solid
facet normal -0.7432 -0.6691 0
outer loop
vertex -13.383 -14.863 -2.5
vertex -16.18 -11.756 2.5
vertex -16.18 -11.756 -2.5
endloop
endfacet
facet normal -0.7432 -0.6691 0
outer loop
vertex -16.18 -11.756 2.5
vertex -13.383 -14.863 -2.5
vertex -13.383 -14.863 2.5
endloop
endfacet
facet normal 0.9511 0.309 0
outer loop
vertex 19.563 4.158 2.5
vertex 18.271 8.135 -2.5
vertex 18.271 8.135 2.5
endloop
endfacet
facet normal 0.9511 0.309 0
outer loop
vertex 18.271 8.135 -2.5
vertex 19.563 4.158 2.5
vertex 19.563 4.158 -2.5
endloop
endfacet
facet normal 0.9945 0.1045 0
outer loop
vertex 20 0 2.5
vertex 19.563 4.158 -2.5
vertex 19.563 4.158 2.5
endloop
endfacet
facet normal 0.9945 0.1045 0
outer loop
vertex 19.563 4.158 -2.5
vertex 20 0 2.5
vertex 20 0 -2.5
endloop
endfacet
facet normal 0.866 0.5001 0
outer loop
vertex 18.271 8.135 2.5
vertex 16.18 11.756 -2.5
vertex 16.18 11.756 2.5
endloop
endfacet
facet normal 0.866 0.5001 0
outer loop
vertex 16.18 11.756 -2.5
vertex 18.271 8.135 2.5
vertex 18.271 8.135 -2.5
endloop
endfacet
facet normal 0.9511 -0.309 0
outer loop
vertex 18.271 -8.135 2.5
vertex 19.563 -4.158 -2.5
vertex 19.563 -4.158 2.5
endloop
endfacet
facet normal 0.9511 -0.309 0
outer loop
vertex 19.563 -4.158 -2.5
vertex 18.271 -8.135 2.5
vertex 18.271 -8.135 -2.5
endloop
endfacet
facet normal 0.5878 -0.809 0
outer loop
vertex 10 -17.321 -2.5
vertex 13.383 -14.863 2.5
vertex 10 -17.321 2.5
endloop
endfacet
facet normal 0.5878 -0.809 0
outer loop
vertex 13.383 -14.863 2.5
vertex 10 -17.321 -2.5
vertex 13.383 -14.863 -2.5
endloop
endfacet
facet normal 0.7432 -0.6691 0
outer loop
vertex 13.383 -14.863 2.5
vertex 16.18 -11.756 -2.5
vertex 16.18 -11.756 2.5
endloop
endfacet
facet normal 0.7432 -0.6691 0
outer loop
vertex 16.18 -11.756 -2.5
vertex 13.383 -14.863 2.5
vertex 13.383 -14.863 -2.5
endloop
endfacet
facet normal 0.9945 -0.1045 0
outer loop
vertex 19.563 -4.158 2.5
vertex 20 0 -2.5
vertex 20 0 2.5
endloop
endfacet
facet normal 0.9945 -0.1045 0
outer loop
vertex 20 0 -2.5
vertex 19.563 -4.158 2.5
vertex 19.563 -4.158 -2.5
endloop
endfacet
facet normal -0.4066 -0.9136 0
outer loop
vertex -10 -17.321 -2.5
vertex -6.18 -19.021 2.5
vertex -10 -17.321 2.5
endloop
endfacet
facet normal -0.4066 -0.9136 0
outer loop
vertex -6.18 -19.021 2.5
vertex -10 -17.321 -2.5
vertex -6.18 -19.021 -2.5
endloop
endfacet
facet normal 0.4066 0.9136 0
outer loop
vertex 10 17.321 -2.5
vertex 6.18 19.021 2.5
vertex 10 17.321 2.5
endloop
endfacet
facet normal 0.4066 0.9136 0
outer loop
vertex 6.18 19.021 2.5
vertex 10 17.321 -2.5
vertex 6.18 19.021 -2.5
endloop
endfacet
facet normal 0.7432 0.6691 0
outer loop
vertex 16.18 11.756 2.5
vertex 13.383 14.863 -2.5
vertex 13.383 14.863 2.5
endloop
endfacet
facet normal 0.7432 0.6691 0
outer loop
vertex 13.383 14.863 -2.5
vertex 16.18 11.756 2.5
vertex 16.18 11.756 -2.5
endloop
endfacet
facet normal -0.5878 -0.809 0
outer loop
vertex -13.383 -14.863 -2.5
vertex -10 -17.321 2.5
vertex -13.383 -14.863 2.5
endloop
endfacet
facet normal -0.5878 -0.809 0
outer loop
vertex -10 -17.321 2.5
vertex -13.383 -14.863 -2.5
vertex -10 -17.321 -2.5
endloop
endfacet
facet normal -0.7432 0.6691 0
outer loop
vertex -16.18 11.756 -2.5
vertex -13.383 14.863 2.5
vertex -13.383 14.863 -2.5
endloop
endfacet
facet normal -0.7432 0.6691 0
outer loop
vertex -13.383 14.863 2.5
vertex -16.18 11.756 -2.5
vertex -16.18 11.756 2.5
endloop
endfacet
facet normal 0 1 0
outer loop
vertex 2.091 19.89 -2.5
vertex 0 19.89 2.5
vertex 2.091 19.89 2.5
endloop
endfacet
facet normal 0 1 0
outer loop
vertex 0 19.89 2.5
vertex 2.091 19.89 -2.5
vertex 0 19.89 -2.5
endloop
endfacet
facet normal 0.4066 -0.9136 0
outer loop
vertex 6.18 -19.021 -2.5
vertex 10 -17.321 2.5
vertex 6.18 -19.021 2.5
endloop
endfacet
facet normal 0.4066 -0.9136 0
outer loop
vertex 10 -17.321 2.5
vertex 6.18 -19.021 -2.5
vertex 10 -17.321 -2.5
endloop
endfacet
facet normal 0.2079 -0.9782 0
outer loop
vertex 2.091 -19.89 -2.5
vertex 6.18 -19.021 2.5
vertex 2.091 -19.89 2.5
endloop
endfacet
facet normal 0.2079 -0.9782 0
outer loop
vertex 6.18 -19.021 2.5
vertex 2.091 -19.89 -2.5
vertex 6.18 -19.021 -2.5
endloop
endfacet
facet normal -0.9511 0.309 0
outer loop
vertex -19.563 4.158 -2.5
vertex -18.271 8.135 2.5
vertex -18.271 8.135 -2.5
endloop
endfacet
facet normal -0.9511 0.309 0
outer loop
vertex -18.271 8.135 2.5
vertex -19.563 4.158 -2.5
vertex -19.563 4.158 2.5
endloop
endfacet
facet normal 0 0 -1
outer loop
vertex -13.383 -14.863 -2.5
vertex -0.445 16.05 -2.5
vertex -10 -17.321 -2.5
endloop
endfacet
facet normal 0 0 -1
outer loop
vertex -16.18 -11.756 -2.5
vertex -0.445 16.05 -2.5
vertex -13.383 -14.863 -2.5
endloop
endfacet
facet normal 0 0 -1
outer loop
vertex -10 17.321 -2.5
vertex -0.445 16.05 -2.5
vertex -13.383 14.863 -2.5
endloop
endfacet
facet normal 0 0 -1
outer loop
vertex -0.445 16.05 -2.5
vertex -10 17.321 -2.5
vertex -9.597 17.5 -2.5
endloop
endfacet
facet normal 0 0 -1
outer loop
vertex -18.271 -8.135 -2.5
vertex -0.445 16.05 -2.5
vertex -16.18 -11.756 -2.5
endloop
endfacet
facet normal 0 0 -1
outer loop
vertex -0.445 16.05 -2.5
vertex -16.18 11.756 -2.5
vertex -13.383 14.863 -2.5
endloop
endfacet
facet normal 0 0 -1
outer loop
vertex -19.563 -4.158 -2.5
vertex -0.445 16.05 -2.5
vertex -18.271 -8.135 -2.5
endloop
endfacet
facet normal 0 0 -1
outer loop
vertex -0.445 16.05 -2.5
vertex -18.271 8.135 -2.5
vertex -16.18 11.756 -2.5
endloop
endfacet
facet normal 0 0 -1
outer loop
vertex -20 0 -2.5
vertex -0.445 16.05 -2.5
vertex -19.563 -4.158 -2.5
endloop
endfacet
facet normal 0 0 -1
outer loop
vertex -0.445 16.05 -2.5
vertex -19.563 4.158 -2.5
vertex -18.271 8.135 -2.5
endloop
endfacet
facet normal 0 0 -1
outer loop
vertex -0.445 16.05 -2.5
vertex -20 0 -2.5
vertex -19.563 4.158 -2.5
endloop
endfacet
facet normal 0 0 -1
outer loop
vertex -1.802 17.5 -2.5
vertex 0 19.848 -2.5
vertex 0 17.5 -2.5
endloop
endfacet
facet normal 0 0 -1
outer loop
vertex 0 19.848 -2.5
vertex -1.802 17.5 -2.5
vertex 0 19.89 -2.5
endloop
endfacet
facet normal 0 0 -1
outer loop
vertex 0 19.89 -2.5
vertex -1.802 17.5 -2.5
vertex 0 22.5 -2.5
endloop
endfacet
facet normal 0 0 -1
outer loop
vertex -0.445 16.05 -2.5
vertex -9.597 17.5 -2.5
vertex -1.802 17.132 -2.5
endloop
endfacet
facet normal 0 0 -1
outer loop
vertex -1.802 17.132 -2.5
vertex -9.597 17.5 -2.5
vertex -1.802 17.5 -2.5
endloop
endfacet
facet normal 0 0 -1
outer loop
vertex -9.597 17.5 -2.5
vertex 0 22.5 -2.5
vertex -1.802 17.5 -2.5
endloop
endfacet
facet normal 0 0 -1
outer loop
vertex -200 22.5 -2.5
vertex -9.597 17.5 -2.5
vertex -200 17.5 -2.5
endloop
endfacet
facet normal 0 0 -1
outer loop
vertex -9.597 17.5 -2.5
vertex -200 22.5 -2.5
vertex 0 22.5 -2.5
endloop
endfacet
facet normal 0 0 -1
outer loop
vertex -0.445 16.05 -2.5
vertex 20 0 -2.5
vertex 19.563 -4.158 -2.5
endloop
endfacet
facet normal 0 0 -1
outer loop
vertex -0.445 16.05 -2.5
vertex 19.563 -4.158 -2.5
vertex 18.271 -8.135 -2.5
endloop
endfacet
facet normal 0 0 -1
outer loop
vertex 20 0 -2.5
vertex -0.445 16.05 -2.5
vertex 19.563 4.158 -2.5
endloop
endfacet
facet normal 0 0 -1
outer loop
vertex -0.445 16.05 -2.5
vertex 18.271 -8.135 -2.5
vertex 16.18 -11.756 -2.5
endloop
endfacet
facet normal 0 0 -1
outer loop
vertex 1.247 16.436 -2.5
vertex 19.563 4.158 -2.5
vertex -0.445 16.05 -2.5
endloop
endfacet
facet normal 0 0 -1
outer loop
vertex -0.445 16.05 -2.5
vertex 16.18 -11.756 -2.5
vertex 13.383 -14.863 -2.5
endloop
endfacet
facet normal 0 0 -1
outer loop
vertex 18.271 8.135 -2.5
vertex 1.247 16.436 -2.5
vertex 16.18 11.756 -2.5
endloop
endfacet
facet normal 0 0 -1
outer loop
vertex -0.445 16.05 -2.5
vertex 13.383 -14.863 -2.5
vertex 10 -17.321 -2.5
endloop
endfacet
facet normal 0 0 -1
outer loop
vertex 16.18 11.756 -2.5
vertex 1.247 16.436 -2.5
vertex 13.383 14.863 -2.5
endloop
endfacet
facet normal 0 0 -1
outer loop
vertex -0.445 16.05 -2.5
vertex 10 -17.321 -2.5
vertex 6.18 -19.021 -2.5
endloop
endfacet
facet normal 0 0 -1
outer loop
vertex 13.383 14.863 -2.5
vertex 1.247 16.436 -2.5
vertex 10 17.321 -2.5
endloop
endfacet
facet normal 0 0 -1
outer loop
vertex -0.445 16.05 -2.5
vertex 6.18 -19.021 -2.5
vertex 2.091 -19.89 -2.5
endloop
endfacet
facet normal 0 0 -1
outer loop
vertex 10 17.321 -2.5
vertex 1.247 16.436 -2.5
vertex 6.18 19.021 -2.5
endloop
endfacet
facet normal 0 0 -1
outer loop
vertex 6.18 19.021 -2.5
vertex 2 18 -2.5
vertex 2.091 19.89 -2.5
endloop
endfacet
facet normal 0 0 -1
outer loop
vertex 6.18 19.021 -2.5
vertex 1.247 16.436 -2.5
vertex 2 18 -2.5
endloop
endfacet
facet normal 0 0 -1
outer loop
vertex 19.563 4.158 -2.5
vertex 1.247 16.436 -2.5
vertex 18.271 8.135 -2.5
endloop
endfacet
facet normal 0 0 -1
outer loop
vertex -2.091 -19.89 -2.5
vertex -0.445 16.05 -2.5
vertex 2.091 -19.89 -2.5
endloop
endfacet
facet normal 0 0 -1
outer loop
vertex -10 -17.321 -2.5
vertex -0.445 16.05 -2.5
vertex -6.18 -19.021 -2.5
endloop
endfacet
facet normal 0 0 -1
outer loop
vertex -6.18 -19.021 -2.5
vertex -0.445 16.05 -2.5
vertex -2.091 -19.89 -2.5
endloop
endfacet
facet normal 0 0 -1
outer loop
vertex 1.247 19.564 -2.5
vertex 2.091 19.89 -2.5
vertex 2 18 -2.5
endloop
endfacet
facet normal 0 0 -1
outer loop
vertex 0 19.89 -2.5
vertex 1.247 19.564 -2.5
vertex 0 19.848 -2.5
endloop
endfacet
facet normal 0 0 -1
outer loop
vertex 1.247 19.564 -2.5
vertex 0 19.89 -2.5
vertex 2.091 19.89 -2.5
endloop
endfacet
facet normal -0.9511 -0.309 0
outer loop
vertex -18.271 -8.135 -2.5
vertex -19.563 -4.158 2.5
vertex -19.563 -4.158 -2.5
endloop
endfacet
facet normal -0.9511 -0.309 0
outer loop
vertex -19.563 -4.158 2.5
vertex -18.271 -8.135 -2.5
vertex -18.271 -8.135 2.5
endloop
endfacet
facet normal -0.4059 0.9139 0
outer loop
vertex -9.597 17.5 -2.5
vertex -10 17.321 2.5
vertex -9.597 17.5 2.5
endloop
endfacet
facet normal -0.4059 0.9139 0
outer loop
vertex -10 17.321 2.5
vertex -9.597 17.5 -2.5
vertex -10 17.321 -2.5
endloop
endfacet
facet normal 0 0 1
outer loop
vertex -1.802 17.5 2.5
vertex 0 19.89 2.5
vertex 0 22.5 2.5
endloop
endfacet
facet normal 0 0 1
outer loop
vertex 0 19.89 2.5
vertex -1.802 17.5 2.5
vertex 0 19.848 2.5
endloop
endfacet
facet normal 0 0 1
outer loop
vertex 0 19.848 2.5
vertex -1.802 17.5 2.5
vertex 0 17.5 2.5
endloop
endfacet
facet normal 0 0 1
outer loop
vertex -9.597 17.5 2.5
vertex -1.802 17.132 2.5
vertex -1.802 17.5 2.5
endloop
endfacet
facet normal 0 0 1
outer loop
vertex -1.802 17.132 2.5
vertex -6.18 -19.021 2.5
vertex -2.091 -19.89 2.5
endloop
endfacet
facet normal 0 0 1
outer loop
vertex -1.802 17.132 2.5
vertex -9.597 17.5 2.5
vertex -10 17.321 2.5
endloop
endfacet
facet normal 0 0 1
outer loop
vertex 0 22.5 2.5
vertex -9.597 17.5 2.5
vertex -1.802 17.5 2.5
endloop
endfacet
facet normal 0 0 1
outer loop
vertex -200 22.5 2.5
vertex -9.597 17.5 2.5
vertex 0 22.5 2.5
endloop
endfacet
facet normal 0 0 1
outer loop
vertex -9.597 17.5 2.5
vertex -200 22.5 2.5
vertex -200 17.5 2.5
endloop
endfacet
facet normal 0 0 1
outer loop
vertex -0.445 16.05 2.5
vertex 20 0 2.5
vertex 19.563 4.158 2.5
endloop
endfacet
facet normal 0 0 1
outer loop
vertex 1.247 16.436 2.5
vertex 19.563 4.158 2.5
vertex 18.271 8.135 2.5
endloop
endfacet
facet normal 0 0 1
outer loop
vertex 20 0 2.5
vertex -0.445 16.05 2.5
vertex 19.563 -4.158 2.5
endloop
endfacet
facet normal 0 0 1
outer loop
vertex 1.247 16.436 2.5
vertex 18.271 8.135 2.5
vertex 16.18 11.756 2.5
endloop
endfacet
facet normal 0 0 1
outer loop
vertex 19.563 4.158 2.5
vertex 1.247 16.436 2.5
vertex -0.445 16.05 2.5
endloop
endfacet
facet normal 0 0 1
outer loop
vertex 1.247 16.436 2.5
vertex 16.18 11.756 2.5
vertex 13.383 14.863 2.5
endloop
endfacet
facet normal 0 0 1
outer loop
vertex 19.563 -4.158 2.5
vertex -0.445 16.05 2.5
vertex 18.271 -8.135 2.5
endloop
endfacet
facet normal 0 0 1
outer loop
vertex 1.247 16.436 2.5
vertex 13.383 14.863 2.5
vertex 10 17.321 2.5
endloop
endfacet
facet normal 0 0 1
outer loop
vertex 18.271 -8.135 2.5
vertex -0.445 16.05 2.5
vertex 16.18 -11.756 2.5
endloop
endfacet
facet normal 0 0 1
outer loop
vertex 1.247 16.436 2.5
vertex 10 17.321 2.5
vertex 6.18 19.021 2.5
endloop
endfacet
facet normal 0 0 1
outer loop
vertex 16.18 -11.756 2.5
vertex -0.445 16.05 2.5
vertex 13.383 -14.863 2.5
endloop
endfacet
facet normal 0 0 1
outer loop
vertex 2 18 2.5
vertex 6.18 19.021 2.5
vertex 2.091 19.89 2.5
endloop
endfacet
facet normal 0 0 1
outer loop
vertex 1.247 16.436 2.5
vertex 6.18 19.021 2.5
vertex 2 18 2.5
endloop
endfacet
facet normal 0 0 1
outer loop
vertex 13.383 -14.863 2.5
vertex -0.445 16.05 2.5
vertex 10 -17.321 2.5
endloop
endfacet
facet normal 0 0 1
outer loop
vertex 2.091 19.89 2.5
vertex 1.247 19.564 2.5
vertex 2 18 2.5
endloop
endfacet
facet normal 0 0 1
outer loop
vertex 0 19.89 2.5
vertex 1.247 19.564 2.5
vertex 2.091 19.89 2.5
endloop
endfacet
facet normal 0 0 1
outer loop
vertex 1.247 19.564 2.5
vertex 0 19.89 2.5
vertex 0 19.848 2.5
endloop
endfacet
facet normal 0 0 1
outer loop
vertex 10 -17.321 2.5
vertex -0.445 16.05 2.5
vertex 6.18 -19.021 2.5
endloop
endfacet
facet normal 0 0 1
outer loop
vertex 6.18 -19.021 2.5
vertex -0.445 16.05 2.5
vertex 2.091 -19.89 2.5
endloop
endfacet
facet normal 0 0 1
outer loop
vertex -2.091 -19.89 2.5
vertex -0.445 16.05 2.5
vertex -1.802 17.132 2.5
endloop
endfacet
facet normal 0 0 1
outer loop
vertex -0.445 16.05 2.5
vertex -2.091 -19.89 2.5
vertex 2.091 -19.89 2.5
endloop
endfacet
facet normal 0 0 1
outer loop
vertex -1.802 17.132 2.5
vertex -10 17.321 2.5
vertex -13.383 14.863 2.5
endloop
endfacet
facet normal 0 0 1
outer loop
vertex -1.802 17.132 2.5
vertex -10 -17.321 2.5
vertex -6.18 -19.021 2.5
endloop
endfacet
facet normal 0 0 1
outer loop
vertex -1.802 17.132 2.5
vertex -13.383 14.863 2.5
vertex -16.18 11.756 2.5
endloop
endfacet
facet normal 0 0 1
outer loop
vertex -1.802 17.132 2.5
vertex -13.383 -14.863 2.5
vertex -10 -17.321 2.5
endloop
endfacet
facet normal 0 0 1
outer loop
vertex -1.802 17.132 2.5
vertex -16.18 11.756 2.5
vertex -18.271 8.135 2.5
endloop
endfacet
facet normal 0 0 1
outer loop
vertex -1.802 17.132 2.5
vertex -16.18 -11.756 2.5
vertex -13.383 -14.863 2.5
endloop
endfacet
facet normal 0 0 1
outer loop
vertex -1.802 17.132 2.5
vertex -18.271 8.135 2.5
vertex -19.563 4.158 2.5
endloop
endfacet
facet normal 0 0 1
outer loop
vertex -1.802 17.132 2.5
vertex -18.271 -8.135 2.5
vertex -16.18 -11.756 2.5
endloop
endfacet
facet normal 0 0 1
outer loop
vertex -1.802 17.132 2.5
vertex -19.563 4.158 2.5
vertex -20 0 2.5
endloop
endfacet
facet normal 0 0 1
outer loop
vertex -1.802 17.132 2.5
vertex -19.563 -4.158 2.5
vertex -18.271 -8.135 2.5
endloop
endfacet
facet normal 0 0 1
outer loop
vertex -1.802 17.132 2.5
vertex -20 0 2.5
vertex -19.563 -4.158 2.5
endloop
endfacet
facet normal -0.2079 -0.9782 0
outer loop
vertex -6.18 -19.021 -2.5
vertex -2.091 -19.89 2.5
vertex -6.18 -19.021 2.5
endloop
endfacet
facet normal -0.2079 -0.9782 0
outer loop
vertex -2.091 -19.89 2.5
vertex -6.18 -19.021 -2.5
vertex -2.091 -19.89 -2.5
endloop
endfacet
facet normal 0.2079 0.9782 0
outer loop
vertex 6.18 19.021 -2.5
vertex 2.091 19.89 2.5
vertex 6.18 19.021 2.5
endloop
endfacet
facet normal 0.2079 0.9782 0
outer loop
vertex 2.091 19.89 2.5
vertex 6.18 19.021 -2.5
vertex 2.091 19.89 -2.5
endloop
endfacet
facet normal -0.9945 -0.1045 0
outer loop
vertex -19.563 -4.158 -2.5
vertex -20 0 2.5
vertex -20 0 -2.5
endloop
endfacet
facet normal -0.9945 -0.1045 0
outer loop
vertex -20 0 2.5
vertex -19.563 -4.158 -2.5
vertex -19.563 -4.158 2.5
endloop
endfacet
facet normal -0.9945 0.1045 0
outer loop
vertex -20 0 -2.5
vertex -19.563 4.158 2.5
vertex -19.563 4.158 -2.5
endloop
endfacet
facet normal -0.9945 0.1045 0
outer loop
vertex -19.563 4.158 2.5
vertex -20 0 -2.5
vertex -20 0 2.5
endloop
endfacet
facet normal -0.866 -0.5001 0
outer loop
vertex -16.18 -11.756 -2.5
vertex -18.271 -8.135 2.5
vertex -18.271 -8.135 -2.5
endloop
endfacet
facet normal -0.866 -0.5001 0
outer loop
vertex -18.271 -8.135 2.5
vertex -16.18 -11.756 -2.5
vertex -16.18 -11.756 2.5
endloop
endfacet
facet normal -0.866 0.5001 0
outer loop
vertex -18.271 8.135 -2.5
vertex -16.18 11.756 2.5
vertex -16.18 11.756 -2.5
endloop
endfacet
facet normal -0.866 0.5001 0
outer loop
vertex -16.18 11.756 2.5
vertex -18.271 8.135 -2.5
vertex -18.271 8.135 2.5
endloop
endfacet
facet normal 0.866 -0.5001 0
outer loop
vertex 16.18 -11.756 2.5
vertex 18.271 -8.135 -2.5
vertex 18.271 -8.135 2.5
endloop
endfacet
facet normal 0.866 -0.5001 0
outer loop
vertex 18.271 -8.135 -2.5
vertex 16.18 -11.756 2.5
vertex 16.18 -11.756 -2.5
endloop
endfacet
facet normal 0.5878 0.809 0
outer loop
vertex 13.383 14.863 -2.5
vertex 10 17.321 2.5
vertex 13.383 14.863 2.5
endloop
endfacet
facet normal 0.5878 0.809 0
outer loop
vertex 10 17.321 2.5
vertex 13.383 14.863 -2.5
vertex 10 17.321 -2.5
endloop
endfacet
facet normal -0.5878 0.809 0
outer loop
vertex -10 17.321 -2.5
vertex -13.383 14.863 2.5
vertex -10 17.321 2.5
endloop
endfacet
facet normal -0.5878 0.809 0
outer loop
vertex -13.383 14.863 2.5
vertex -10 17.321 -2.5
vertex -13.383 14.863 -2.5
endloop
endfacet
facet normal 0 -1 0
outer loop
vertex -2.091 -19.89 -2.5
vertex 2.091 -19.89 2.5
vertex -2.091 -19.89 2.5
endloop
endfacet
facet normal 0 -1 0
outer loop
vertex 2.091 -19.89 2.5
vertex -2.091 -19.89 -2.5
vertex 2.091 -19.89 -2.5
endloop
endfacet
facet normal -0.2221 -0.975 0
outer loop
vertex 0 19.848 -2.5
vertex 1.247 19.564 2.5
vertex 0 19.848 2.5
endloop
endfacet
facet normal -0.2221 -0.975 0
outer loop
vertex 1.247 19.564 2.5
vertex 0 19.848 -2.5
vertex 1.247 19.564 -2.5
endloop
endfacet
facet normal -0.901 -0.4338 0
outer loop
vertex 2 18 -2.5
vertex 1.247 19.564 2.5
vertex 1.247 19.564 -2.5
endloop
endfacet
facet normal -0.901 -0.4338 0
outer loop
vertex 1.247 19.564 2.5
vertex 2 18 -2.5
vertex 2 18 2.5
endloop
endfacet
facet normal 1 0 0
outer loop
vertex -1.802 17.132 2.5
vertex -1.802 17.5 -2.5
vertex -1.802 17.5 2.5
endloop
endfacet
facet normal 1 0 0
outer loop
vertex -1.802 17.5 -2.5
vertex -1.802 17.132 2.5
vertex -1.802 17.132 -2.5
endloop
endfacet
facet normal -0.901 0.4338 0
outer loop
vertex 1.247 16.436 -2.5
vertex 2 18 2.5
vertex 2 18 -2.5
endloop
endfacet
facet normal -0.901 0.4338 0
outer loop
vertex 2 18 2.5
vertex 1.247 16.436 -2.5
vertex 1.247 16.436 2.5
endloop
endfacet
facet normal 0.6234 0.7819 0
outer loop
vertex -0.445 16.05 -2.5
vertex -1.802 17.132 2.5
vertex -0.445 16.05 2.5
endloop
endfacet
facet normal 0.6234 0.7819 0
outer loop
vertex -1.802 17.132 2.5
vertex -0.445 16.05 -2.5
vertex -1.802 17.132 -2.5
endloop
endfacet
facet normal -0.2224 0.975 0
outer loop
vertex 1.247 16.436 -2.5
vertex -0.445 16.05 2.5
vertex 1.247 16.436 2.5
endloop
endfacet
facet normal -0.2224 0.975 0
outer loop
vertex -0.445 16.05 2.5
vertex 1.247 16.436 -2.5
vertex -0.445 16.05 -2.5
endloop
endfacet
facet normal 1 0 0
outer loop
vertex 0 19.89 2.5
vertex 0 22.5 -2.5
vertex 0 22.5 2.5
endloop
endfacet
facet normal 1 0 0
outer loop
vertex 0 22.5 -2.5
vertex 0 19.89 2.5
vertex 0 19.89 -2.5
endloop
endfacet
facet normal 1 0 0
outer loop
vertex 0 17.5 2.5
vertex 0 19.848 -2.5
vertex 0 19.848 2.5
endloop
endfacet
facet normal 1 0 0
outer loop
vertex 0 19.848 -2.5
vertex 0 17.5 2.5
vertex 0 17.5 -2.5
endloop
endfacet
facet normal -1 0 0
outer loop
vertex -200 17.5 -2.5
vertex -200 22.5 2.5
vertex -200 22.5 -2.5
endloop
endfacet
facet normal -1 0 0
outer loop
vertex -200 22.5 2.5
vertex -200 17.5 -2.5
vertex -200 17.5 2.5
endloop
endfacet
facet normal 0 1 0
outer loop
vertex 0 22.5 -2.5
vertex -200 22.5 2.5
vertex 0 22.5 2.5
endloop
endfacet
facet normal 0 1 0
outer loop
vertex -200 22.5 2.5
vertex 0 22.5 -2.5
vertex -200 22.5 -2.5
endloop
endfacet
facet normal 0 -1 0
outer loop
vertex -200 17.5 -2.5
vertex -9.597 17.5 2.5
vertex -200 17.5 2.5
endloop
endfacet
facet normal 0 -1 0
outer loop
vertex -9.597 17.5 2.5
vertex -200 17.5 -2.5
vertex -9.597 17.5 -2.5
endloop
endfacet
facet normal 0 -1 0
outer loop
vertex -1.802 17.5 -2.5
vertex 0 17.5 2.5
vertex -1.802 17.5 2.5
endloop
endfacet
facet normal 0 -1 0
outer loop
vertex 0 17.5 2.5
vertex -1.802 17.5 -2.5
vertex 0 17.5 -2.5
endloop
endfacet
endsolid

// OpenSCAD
module wiper_assembly(arm_length, sweep_angle)
{
    assert(arm_length > 0 && sweep_angle > 0);

    _current_angle = -cos($t * 360) * sweep_angle/2;

        cylinder(r=5, h=10, center=true);

    rotate([0, 0, _current_angle])
    {
        cube([arm_length, 10, 5]);    
    }
    
}

PI = 3.14159;


module rack_and_pinion(pinion_r, rack_length, is_assembly=true)
{
    assert(pinion_r > 0 && rack_length > 0);

    // 0 to 360
    _angle = (is_assembly) ? $t * 360 : 0;

    // pinion
    rotate([0,0,-_angle])
    difference() 
    {    
        cylinder(r=pinion_r, h=5, center=is_assembly);
        translate([0,pinion_r*0.9,(is_assembly) ? 0 : -0.01])
            cylinder(r=pinion_r/10, h=5.02, center=is_assembly);
    }
    
    // to start at the beginning of the rack
    _offset = (is_assembly) ? rack_length/2 : 0;

    // rack
    translate([_angle * (PI/180) * pinion_r - _offset,(is_assembly) ? pinion_r : pinion_r * 2,0])
     cube(size=[rack_length, 5, 5], center=true);
}

rack_and_pinion(20,200);
